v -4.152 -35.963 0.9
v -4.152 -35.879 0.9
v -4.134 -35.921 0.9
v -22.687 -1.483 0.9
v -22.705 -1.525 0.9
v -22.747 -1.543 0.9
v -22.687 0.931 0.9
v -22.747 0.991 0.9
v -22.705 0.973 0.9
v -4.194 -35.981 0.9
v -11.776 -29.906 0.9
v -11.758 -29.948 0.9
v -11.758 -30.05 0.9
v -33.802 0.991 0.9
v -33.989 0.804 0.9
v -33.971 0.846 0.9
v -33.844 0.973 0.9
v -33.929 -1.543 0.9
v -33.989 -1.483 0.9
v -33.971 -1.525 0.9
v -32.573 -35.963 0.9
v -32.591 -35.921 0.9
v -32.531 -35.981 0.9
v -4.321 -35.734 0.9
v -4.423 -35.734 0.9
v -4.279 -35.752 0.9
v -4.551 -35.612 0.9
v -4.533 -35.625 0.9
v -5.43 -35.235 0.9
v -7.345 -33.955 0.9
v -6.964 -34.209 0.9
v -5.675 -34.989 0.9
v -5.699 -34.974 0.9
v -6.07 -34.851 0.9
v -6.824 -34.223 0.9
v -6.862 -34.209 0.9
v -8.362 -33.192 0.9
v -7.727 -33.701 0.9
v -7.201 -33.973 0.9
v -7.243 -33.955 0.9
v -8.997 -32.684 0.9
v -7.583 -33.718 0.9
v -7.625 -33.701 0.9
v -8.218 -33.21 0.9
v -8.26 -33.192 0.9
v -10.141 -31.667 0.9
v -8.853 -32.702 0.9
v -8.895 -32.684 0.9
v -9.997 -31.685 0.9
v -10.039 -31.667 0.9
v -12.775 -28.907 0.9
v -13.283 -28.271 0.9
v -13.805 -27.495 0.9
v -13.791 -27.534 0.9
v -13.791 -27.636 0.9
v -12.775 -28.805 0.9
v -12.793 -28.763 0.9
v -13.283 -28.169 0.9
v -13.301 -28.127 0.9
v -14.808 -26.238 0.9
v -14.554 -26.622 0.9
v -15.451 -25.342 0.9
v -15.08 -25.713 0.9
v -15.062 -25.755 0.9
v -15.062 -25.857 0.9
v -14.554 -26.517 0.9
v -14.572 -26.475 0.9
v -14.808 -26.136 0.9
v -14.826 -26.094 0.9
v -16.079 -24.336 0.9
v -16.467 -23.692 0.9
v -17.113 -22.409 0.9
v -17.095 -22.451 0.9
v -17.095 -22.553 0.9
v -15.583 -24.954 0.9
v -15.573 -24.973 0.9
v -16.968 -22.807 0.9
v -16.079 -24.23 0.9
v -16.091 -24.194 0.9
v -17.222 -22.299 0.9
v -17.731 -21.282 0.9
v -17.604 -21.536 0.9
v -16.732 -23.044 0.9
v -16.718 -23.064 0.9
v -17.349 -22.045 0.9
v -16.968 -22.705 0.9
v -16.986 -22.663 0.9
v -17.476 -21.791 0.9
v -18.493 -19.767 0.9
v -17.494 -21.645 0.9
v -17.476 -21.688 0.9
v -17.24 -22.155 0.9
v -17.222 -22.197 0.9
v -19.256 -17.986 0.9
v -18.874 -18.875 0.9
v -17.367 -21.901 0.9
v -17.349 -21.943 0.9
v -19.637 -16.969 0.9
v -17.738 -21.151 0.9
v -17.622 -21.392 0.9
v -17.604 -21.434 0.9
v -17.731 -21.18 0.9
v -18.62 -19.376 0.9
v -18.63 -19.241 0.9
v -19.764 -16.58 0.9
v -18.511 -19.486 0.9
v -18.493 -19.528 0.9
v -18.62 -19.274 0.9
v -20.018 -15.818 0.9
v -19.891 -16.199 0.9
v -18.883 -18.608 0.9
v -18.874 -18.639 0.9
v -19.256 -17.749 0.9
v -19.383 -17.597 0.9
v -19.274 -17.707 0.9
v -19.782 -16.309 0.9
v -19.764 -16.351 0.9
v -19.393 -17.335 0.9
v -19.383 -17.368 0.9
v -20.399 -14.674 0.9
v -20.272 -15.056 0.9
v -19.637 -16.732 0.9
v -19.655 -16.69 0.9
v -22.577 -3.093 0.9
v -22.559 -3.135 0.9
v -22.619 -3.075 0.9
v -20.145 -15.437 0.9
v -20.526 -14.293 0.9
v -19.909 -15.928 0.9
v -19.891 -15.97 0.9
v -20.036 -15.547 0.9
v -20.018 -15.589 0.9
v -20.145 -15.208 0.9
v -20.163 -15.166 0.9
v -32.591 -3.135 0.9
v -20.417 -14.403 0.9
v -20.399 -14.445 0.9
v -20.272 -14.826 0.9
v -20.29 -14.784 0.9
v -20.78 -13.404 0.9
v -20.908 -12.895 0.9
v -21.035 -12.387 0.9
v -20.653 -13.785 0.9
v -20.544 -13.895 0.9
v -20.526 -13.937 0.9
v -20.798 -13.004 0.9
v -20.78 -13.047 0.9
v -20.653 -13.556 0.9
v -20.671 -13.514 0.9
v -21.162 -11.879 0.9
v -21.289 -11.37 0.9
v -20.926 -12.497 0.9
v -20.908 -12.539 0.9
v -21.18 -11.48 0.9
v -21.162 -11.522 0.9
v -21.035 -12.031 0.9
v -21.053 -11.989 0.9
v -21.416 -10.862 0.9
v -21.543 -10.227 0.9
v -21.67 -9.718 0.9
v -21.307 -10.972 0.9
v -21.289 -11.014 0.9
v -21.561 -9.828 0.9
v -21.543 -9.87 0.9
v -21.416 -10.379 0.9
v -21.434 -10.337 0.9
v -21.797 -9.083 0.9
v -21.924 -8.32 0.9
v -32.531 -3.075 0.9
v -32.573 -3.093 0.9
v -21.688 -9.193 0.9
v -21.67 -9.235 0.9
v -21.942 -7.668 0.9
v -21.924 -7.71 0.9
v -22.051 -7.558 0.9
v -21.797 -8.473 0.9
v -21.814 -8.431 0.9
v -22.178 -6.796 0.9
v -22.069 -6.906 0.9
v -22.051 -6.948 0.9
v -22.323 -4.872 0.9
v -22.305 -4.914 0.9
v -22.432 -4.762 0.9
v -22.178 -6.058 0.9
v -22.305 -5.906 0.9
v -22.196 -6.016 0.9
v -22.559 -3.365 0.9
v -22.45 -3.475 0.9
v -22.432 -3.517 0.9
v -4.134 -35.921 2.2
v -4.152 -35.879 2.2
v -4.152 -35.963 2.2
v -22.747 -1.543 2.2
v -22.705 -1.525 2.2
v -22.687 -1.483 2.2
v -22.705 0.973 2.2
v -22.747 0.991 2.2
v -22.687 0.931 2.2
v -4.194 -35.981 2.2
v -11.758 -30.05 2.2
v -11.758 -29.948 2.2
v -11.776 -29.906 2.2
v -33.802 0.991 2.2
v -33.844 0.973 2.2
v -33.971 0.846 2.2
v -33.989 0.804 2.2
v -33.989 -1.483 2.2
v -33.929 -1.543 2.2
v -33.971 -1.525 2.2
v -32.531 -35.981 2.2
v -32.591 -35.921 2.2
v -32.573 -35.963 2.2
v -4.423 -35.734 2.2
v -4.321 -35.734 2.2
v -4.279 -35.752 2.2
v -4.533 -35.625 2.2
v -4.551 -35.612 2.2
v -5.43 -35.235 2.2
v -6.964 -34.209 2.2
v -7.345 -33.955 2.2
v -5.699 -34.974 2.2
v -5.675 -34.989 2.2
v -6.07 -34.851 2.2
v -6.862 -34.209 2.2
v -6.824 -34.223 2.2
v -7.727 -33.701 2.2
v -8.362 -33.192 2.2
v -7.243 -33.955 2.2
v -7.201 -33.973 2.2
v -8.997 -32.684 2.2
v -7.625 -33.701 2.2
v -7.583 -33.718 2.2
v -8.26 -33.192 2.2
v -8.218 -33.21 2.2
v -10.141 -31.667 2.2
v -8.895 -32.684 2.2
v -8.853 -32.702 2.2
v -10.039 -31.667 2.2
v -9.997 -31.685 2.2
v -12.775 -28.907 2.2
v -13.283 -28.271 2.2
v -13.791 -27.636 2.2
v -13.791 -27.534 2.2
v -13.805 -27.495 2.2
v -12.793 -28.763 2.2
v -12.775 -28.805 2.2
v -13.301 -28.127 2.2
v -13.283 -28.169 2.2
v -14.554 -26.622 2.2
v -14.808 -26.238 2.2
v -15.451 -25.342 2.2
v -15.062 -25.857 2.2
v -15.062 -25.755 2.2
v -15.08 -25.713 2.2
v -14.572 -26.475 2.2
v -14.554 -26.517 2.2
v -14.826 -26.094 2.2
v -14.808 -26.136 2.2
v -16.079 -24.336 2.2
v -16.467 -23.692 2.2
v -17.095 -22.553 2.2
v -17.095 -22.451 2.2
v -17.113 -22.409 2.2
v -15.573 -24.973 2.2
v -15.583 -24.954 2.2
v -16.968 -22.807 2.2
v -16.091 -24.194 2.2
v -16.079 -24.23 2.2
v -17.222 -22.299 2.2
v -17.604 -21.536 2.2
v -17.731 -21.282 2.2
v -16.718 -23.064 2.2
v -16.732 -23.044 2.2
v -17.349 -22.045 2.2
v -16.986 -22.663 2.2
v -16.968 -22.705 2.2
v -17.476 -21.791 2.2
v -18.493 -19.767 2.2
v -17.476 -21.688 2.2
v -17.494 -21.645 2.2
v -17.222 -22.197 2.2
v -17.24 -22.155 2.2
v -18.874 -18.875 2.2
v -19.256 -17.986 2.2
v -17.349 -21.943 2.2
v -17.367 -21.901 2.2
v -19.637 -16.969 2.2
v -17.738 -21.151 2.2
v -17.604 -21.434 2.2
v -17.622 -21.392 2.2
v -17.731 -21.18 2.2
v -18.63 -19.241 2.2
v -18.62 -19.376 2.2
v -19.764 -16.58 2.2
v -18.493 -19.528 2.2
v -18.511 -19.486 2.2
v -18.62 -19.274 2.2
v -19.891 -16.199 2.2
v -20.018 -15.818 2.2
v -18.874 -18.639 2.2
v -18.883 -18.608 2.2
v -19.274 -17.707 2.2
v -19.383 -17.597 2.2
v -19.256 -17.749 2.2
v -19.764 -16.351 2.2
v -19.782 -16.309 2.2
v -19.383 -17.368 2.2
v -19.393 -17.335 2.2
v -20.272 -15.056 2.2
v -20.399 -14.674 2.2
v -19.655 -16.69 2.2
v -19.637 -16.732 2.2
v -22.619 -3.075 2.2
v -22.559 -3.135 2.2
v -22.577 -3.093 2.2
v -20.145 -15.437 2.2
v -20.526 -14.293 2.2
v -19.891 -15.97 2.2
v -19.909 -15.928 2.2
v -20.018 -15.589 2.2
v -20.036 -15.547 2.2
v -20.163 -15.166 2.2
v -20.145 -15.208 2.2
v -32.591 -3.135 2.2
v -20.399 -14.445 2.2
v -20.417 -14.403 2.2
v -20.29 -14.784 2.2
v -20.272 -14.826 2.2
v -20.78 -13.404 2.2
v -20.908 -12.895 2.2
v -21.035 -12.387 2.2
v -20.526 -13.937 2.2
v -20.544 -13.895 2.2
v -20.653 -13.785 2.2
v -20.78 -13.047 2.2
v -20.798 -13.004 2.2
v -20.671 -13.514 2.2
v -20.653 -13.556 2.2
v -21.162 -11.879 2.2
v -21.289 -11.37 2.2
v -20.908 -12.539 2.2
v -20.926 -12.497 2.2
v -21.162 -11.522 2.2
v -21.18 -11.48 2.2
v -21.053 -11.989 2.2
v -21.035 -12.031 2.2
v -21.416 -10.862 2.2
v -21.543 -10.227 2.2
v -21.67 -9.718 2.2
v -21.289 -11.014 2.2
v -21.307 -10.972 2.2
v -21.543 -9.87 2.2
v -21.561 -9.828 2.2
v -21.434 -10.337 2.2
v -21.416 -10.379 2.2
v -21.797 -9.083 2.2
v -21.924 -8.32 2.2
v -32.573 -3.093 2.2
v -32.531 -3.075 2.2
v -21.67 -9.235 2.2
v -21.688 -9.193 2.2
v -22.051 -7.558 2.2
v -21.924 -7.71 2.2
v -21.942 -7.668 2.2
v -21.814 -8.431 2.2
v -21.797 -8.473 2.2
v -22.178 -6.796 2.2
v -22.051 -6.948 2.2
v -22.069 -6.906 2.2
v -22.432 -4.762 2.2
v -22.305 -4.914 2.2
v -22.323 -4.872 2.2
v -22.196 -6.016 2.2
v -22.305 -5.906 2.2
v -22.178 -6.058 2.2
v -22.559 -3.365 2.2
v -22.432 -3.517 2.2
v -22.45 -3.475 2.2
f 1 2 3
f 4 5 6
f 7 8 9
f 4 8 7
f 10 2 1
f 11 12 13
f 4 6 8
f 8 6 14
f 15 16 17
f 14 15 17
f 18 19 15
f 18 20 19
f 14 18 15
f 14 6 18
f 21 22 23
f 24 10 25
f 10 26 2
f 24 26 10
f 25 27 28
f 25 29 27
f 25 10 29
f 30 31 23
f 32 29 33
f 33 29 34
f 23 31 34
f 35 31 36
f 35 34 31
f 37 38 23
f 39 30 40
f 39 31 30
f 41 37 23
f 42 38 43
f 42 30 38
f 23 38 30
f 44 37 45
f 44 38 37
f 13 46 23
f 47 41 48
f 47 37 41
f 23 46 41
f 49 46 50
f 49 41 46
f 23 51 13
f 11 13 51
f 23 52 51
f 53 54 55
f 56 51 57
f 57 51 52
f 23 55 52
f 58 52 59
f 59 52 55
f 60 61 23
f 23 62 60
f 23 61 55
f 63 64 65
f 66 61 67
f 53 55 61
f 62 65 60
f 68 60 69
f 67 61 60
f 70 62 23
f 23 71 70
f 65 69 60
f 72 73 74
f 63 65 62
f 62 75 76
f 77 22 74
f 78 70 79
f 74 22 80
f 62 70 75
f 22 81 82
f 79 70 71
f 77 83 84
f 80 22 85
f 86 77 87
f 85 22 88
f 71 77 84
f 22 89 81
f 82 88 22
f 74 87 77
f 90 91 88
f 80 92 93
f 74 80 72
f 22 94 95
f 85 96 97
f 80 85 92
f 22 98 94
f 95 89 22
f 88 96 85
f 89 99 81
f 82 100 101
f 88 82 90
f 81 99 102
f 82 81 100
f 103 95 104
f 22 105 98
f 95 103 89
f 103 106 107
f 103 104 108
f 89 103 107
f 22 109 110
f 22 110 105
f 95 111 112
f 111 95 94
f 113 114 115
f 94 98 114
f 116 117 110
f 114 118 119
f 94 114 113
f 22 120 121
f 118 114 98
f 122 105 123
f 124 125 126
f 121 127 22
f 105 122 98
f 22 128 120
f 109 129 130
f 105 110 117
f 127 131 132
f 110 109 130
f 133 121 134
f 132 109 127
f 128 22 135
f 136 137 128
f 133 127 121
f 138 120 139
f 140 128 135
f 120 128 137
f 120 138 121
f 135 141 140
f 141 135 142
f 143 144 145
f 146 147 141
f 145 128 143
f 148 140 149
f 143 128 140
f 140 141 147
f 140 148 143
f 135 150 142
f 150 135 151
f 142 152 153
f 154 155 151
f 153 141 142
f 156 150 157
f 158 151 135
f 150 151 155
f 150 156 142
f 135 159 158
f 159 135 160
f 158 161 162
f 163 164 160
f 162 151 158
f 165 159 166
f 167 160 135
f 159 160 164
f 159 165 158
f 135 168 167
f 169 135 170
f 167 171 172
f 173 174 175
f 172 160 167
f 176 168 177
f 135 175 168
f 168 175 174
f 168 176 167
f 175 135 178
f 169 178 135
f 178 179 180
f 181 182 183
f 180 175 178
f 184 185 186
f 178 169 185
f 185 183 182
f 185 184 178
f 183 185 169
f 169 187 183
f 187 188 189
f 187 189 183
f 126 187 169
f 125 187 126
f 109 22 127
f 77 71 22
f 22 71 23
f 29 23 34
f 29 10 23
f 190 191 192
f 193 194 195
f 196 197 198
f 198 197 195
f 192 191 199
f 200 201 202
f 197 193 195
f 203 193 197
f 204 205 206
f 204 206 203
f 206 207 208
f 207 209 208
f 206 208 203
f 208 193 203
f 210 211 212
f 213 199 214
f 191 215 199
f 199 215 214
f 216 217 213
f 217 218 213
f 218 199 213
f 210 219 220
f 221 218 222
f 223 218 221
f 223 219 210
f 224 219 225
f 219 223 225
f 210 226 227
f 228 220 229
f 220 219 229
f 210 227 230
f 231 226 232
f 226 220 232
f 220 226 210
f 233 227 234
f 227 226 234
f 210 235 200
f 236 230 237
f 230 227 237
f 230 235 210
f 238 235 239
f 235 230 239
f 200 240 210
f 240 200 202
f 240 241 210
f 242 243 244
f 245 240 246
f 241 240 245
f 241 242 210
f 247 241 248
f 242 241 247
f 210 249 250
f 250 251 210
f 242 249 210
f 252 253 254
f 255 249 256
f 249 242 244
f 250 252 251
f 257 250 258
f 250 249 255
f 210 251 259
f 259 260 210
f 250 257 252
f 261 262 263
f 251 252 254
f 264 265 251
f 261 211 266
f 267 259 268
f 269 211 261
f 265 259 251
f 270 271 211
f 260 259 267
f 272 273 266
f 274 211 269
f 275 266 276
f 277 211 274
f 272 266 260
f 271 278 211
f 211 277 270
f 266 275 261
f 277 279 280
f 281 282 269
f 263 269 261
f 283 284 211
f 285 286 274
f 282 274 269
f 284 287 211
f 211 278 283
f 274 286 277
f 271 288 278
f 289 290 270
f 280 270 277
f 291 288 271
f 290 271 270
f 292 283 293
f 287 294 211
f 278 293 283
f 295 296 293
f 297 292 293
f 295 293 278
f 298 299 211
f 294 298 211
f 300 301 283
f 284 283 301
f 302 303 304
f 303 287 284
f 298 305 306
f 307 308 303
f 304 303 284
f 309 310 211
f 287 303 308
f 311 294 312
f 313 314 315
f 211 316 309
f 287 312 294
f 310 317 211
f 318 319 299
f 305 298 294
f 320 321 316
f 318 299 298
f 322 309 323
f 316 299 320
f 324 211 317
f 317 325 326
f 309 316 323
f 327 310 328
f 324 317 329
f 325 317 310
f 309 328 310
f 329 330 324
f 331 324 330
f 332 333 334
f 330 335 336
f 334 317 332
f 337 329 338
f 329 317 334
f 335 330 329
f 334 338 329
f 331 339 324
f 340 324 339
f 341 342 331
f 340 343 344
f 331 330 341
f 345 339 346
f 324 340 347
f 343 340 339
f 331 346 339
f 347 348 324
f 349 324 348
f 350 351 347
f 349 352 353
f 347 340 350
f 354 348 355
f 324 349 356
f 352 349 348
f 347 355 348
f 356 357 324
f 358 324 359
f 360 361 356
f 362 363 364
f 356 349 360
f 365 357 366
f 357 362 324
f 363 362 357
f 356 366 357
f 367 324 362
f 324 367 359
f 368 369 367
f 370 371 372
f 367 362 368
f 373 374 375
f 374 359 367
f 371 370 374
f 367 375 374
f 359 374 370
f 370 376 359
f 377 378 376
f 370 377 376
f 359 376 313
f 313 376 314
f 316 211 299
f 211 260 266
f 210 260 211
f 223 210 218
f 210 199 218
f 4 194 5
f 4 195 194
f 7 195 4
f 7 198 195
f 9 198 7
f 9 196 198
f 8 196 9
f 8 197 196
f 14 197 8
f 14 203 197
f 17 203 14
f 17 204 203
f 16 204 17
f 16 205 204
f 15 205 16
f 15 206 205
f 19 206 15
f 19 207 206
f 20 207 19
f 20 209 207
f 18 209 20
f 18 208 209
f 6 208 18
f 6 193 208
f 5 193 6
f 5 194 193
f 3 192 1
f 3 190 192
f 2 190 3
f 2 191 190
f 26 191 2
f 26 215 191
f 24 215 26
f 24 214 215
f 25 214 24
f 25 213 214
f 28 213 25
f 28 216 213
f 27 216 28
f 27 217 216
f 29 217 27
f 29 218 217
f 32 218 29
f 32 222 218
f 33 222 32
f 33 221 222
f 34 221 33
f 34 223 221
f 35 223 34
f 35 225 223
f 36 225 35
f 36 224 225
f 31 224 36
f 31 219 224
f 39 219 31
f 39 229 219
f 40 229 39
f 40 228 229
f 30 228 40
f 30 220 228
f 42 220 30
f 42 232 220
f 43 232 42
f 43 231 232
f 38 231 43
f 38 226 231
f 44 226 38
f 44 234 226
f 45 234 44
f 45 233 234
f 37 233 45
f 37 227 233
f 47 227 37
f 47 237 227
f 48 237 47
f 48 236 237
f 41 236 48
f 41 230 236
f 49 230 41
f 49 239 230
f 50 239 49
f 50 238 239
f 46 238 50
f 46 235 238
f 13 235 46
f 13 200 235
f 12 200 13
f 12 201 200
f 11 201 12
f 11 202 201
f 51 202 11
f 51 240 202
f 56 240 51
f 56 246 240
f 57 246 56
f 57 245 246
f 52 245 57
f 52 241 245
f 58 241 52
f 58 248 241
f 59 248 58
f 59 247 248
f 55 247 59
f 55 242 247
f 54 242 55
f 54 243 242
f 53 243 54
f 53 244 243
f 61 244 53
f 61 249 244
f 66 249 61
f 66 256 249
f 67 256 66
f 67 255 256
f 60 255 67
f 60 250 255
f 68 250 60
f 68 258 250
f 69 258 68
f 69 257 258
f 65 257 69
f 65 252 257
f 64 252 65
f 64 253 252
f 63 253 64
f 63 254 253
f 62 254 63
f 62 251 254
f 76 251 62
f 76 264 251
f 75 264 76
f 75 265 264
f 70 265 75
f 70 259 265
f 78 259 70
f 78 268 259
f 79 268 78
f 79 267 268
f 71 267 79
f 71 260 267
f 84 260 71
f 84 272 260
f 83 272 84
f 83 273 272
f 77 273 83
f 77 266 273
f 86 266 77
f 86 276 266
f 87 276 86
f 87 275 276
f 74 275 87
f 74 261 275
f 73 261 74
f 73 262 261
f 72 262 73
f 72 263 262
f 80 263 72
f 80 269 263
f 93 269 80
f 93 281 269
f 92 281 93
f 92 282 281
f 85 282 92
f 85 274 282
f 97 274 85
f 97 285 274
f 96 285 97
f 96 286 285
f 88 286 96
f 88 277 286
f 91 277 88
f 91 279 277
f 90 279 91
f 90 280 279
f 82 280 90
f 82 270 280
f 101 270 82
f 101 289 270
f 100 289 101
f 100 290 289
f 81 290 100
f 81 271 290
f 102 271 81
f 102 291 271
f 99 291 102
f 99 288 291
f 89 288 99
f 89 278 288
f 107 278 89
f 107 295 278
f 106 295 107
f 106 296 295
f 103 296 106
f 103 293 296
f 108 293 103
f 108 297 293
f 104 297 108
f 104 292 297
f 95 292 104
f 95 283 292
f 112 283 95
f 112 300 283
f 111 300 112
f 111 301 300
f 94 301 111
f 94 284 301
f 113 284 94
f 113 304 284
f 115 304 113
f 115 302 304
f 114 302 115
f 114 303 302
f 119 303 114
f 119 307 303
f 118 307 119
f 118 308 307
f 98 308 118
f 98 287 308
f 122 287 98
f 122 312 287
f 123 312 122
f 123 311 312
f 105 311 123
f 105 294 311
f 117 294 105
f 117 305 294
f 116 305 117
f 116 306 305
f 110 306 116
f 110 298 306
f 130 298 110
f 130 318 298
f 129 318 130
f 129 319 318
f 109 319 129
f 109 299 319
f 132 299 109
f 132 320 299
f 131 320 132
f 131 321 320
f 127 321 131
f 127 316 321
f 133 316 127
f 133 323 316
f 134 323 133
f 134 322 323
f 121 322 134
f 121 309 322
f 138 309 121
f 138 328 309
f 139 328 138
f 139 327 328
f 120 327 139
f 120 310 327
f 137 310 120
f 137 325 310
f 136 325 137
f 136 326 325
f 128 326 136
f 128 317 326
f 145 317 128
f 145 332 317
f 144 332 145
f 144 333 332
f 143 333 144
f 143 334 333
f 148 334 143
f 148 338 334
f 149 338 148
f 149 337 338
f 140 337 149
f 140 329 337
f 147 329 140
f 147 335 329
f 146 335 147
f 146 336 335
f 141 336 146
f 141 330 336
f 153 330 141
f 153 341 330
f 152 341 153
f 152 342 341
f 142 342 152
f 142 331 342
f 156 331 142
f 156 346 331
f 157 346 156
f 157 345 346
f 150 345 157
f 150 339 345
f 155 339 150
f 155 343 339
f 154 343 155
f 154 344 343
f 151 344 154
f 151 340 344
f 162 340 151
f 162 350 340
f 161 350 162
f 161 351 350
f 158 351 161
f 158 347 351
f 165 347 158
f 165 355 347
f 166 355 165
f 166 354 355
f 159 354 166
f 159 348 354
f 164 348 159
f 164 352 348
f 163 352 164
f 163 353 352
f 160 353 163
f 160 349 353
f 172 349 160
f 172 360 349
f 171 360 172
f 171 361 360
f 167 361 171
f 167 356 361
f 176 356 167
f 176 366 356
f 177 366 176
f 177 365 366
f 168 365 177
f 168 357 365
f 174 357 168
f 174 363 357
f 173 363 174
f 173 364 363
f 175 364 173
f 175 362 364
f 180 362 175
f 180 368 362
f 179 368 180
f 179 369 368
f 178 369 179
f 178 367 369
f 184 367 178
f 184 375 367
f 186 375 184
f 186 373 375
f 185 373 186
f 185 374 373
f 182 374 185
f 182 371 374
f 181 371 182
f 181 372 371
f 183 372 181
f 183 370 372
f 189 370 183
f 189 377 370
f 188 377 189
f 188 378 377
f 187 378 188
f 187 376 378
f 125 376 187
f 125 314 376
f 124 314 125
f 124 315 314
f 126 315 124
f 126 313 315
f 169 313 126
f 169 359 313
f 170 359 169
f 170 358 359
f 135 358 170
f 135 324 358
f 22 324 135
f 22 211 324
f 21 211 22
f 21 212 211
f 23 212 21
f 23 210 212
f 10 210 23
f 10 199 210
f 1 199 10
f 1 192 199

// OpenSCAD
$fn = 24;
translate([0, -2.500, 0.900])
  linear_extrude(height=1.300) {
offset(r=0.06, $fn=8) {
    polygon(points=[[-32.531,-0.635],[-32.531,-33.421],[-4.194,-33.421],[-4.321,-33.294],[-4.448,-33.294],[-4.575,-33.167],[-5.464,-32.786],[-5.718,-32.531],[-6.100,-32.404],[-6.862,-31.769],[-6.989,-31.769],[-7.243,-31.515],[-7.370,-31.515],[-7.625,-31.261],[-7.752,-31.261],[-8.260,-30.752],[-8.387,-30.752],[-8.895,-30.244],[-9.022,-30.244],[-10.039,-29.227],[-10.166,-29.227],[-11.818,-27.575],[-11.818,-27.448],[-12.835,-26.432],[-12.835,-26.305],[-13.343,-25.796],[-13.343,-25.669],[-13.851,-25.161],[-13.851,-25.034],[-14.614,-24.144],[-14.614,-24.017],[-14.868,-23.763],[-14.868,-23.636],[-15.122,-23.382],[-15.122,-23.255],[-15.503,-22.874],[-15.630,-22.492],[-16.139,-21.857],[-16.139,-21.730],[-16.520,-21.222],[-16.774,-20.586],[-17.028,-20.332],[-17.028,-20.205],[-17.155,-20.078],[-17.155,-19.951],[-17.282,-19.824],[-17.282,-19.697],[-17.409,-19.570],[-17.409,-19.443],[-17.536,-19.316],[-17.536,-19.188],[-17.664,-19.061],[-17.664,-18.934],[-17.791,-18.807],[-17.791,-18.680],[-18.553,-17.282],[-18.553,-17.028],[-18.680,-16.901],[-18.680,-16.774],[-18.934,-16.393],[-18.934,-16.139],[-19.316,-15.503],[-19.316,-15.249],[-19.443,-15.122],[-19.443,-14.868],[-19.697,-14.487],[-19.697,-14.232],[-19.824,-14.105],[-19.824,-13.851],[-19.951,-13.724],[-19.951,-13.470],[-20.078,-13.343],[-20.078,-13.089],[-20.205,-12.962],[-20.205,-12.708],[-20.332,-12.581],[-20.332,-12.326],[-20.459,-12.199],[-20.459,-11.945],[-20.586,-11.818],[-20.586,-11.437],[-20.713,-11.310],[-20.713,-11.056],[-20.840,-10.929],[-20.840,-10.547],[-20.968,-10.420],[-20.968,-10.039],[-21.095,-9.912],[-21.095,-9.531],[-21.222,-9.404],[-21.222,-9.022],[-21.349,-8.895],[-21.349,-8.514],[-21.476,-8.387],[-21.476,-7.879],[-21.603,-7.752],[-21.603,-7.370],[-21.730,-7.243],[-21.730,-6.735],[-21.857,-6.608],[-21.857,-5.973],[-21.984,-5.845],[-21.984,-5.210],[-22.111,-5.083],[-22.111,-4.448],[-22.238,-4.321],[-22.238,-3.558],[-22.365,-3.431],[-22.365,-2.414],[-22.492,-2.287],[-22.492,-1.017],[-22.619,-0.890],[-22.619,-0.635]], paths=[[0,1,2,3,4,5,6,7,8,9,10,11,12,13,14,15,16,17,18,19,20,21,22,23,24,25,26,27,28,29,30,31,32,33,34,35,36,37,38,39,40,41,42,43,44,45,46,47,48,49,50,51,52,53,54,55,56,57,58,59,60,61,62,63,64,65,66,67,68,69,70,71,72,73,74,75,76,77,78,79,80,81,82,83,84,85,86,87,88,89,90,91,92,93,94,95,96,97,98,99,100,101,102,103,104,105,106,107,108,109,110,111,112]]);
    polygon(points=[[-33.929,3.304],[-33.929,1.017],[-22.747,1.017],[-22.747,3.431],[-33.802,3.431]], paths=[[0,1,2,3,4]]);
}
}
